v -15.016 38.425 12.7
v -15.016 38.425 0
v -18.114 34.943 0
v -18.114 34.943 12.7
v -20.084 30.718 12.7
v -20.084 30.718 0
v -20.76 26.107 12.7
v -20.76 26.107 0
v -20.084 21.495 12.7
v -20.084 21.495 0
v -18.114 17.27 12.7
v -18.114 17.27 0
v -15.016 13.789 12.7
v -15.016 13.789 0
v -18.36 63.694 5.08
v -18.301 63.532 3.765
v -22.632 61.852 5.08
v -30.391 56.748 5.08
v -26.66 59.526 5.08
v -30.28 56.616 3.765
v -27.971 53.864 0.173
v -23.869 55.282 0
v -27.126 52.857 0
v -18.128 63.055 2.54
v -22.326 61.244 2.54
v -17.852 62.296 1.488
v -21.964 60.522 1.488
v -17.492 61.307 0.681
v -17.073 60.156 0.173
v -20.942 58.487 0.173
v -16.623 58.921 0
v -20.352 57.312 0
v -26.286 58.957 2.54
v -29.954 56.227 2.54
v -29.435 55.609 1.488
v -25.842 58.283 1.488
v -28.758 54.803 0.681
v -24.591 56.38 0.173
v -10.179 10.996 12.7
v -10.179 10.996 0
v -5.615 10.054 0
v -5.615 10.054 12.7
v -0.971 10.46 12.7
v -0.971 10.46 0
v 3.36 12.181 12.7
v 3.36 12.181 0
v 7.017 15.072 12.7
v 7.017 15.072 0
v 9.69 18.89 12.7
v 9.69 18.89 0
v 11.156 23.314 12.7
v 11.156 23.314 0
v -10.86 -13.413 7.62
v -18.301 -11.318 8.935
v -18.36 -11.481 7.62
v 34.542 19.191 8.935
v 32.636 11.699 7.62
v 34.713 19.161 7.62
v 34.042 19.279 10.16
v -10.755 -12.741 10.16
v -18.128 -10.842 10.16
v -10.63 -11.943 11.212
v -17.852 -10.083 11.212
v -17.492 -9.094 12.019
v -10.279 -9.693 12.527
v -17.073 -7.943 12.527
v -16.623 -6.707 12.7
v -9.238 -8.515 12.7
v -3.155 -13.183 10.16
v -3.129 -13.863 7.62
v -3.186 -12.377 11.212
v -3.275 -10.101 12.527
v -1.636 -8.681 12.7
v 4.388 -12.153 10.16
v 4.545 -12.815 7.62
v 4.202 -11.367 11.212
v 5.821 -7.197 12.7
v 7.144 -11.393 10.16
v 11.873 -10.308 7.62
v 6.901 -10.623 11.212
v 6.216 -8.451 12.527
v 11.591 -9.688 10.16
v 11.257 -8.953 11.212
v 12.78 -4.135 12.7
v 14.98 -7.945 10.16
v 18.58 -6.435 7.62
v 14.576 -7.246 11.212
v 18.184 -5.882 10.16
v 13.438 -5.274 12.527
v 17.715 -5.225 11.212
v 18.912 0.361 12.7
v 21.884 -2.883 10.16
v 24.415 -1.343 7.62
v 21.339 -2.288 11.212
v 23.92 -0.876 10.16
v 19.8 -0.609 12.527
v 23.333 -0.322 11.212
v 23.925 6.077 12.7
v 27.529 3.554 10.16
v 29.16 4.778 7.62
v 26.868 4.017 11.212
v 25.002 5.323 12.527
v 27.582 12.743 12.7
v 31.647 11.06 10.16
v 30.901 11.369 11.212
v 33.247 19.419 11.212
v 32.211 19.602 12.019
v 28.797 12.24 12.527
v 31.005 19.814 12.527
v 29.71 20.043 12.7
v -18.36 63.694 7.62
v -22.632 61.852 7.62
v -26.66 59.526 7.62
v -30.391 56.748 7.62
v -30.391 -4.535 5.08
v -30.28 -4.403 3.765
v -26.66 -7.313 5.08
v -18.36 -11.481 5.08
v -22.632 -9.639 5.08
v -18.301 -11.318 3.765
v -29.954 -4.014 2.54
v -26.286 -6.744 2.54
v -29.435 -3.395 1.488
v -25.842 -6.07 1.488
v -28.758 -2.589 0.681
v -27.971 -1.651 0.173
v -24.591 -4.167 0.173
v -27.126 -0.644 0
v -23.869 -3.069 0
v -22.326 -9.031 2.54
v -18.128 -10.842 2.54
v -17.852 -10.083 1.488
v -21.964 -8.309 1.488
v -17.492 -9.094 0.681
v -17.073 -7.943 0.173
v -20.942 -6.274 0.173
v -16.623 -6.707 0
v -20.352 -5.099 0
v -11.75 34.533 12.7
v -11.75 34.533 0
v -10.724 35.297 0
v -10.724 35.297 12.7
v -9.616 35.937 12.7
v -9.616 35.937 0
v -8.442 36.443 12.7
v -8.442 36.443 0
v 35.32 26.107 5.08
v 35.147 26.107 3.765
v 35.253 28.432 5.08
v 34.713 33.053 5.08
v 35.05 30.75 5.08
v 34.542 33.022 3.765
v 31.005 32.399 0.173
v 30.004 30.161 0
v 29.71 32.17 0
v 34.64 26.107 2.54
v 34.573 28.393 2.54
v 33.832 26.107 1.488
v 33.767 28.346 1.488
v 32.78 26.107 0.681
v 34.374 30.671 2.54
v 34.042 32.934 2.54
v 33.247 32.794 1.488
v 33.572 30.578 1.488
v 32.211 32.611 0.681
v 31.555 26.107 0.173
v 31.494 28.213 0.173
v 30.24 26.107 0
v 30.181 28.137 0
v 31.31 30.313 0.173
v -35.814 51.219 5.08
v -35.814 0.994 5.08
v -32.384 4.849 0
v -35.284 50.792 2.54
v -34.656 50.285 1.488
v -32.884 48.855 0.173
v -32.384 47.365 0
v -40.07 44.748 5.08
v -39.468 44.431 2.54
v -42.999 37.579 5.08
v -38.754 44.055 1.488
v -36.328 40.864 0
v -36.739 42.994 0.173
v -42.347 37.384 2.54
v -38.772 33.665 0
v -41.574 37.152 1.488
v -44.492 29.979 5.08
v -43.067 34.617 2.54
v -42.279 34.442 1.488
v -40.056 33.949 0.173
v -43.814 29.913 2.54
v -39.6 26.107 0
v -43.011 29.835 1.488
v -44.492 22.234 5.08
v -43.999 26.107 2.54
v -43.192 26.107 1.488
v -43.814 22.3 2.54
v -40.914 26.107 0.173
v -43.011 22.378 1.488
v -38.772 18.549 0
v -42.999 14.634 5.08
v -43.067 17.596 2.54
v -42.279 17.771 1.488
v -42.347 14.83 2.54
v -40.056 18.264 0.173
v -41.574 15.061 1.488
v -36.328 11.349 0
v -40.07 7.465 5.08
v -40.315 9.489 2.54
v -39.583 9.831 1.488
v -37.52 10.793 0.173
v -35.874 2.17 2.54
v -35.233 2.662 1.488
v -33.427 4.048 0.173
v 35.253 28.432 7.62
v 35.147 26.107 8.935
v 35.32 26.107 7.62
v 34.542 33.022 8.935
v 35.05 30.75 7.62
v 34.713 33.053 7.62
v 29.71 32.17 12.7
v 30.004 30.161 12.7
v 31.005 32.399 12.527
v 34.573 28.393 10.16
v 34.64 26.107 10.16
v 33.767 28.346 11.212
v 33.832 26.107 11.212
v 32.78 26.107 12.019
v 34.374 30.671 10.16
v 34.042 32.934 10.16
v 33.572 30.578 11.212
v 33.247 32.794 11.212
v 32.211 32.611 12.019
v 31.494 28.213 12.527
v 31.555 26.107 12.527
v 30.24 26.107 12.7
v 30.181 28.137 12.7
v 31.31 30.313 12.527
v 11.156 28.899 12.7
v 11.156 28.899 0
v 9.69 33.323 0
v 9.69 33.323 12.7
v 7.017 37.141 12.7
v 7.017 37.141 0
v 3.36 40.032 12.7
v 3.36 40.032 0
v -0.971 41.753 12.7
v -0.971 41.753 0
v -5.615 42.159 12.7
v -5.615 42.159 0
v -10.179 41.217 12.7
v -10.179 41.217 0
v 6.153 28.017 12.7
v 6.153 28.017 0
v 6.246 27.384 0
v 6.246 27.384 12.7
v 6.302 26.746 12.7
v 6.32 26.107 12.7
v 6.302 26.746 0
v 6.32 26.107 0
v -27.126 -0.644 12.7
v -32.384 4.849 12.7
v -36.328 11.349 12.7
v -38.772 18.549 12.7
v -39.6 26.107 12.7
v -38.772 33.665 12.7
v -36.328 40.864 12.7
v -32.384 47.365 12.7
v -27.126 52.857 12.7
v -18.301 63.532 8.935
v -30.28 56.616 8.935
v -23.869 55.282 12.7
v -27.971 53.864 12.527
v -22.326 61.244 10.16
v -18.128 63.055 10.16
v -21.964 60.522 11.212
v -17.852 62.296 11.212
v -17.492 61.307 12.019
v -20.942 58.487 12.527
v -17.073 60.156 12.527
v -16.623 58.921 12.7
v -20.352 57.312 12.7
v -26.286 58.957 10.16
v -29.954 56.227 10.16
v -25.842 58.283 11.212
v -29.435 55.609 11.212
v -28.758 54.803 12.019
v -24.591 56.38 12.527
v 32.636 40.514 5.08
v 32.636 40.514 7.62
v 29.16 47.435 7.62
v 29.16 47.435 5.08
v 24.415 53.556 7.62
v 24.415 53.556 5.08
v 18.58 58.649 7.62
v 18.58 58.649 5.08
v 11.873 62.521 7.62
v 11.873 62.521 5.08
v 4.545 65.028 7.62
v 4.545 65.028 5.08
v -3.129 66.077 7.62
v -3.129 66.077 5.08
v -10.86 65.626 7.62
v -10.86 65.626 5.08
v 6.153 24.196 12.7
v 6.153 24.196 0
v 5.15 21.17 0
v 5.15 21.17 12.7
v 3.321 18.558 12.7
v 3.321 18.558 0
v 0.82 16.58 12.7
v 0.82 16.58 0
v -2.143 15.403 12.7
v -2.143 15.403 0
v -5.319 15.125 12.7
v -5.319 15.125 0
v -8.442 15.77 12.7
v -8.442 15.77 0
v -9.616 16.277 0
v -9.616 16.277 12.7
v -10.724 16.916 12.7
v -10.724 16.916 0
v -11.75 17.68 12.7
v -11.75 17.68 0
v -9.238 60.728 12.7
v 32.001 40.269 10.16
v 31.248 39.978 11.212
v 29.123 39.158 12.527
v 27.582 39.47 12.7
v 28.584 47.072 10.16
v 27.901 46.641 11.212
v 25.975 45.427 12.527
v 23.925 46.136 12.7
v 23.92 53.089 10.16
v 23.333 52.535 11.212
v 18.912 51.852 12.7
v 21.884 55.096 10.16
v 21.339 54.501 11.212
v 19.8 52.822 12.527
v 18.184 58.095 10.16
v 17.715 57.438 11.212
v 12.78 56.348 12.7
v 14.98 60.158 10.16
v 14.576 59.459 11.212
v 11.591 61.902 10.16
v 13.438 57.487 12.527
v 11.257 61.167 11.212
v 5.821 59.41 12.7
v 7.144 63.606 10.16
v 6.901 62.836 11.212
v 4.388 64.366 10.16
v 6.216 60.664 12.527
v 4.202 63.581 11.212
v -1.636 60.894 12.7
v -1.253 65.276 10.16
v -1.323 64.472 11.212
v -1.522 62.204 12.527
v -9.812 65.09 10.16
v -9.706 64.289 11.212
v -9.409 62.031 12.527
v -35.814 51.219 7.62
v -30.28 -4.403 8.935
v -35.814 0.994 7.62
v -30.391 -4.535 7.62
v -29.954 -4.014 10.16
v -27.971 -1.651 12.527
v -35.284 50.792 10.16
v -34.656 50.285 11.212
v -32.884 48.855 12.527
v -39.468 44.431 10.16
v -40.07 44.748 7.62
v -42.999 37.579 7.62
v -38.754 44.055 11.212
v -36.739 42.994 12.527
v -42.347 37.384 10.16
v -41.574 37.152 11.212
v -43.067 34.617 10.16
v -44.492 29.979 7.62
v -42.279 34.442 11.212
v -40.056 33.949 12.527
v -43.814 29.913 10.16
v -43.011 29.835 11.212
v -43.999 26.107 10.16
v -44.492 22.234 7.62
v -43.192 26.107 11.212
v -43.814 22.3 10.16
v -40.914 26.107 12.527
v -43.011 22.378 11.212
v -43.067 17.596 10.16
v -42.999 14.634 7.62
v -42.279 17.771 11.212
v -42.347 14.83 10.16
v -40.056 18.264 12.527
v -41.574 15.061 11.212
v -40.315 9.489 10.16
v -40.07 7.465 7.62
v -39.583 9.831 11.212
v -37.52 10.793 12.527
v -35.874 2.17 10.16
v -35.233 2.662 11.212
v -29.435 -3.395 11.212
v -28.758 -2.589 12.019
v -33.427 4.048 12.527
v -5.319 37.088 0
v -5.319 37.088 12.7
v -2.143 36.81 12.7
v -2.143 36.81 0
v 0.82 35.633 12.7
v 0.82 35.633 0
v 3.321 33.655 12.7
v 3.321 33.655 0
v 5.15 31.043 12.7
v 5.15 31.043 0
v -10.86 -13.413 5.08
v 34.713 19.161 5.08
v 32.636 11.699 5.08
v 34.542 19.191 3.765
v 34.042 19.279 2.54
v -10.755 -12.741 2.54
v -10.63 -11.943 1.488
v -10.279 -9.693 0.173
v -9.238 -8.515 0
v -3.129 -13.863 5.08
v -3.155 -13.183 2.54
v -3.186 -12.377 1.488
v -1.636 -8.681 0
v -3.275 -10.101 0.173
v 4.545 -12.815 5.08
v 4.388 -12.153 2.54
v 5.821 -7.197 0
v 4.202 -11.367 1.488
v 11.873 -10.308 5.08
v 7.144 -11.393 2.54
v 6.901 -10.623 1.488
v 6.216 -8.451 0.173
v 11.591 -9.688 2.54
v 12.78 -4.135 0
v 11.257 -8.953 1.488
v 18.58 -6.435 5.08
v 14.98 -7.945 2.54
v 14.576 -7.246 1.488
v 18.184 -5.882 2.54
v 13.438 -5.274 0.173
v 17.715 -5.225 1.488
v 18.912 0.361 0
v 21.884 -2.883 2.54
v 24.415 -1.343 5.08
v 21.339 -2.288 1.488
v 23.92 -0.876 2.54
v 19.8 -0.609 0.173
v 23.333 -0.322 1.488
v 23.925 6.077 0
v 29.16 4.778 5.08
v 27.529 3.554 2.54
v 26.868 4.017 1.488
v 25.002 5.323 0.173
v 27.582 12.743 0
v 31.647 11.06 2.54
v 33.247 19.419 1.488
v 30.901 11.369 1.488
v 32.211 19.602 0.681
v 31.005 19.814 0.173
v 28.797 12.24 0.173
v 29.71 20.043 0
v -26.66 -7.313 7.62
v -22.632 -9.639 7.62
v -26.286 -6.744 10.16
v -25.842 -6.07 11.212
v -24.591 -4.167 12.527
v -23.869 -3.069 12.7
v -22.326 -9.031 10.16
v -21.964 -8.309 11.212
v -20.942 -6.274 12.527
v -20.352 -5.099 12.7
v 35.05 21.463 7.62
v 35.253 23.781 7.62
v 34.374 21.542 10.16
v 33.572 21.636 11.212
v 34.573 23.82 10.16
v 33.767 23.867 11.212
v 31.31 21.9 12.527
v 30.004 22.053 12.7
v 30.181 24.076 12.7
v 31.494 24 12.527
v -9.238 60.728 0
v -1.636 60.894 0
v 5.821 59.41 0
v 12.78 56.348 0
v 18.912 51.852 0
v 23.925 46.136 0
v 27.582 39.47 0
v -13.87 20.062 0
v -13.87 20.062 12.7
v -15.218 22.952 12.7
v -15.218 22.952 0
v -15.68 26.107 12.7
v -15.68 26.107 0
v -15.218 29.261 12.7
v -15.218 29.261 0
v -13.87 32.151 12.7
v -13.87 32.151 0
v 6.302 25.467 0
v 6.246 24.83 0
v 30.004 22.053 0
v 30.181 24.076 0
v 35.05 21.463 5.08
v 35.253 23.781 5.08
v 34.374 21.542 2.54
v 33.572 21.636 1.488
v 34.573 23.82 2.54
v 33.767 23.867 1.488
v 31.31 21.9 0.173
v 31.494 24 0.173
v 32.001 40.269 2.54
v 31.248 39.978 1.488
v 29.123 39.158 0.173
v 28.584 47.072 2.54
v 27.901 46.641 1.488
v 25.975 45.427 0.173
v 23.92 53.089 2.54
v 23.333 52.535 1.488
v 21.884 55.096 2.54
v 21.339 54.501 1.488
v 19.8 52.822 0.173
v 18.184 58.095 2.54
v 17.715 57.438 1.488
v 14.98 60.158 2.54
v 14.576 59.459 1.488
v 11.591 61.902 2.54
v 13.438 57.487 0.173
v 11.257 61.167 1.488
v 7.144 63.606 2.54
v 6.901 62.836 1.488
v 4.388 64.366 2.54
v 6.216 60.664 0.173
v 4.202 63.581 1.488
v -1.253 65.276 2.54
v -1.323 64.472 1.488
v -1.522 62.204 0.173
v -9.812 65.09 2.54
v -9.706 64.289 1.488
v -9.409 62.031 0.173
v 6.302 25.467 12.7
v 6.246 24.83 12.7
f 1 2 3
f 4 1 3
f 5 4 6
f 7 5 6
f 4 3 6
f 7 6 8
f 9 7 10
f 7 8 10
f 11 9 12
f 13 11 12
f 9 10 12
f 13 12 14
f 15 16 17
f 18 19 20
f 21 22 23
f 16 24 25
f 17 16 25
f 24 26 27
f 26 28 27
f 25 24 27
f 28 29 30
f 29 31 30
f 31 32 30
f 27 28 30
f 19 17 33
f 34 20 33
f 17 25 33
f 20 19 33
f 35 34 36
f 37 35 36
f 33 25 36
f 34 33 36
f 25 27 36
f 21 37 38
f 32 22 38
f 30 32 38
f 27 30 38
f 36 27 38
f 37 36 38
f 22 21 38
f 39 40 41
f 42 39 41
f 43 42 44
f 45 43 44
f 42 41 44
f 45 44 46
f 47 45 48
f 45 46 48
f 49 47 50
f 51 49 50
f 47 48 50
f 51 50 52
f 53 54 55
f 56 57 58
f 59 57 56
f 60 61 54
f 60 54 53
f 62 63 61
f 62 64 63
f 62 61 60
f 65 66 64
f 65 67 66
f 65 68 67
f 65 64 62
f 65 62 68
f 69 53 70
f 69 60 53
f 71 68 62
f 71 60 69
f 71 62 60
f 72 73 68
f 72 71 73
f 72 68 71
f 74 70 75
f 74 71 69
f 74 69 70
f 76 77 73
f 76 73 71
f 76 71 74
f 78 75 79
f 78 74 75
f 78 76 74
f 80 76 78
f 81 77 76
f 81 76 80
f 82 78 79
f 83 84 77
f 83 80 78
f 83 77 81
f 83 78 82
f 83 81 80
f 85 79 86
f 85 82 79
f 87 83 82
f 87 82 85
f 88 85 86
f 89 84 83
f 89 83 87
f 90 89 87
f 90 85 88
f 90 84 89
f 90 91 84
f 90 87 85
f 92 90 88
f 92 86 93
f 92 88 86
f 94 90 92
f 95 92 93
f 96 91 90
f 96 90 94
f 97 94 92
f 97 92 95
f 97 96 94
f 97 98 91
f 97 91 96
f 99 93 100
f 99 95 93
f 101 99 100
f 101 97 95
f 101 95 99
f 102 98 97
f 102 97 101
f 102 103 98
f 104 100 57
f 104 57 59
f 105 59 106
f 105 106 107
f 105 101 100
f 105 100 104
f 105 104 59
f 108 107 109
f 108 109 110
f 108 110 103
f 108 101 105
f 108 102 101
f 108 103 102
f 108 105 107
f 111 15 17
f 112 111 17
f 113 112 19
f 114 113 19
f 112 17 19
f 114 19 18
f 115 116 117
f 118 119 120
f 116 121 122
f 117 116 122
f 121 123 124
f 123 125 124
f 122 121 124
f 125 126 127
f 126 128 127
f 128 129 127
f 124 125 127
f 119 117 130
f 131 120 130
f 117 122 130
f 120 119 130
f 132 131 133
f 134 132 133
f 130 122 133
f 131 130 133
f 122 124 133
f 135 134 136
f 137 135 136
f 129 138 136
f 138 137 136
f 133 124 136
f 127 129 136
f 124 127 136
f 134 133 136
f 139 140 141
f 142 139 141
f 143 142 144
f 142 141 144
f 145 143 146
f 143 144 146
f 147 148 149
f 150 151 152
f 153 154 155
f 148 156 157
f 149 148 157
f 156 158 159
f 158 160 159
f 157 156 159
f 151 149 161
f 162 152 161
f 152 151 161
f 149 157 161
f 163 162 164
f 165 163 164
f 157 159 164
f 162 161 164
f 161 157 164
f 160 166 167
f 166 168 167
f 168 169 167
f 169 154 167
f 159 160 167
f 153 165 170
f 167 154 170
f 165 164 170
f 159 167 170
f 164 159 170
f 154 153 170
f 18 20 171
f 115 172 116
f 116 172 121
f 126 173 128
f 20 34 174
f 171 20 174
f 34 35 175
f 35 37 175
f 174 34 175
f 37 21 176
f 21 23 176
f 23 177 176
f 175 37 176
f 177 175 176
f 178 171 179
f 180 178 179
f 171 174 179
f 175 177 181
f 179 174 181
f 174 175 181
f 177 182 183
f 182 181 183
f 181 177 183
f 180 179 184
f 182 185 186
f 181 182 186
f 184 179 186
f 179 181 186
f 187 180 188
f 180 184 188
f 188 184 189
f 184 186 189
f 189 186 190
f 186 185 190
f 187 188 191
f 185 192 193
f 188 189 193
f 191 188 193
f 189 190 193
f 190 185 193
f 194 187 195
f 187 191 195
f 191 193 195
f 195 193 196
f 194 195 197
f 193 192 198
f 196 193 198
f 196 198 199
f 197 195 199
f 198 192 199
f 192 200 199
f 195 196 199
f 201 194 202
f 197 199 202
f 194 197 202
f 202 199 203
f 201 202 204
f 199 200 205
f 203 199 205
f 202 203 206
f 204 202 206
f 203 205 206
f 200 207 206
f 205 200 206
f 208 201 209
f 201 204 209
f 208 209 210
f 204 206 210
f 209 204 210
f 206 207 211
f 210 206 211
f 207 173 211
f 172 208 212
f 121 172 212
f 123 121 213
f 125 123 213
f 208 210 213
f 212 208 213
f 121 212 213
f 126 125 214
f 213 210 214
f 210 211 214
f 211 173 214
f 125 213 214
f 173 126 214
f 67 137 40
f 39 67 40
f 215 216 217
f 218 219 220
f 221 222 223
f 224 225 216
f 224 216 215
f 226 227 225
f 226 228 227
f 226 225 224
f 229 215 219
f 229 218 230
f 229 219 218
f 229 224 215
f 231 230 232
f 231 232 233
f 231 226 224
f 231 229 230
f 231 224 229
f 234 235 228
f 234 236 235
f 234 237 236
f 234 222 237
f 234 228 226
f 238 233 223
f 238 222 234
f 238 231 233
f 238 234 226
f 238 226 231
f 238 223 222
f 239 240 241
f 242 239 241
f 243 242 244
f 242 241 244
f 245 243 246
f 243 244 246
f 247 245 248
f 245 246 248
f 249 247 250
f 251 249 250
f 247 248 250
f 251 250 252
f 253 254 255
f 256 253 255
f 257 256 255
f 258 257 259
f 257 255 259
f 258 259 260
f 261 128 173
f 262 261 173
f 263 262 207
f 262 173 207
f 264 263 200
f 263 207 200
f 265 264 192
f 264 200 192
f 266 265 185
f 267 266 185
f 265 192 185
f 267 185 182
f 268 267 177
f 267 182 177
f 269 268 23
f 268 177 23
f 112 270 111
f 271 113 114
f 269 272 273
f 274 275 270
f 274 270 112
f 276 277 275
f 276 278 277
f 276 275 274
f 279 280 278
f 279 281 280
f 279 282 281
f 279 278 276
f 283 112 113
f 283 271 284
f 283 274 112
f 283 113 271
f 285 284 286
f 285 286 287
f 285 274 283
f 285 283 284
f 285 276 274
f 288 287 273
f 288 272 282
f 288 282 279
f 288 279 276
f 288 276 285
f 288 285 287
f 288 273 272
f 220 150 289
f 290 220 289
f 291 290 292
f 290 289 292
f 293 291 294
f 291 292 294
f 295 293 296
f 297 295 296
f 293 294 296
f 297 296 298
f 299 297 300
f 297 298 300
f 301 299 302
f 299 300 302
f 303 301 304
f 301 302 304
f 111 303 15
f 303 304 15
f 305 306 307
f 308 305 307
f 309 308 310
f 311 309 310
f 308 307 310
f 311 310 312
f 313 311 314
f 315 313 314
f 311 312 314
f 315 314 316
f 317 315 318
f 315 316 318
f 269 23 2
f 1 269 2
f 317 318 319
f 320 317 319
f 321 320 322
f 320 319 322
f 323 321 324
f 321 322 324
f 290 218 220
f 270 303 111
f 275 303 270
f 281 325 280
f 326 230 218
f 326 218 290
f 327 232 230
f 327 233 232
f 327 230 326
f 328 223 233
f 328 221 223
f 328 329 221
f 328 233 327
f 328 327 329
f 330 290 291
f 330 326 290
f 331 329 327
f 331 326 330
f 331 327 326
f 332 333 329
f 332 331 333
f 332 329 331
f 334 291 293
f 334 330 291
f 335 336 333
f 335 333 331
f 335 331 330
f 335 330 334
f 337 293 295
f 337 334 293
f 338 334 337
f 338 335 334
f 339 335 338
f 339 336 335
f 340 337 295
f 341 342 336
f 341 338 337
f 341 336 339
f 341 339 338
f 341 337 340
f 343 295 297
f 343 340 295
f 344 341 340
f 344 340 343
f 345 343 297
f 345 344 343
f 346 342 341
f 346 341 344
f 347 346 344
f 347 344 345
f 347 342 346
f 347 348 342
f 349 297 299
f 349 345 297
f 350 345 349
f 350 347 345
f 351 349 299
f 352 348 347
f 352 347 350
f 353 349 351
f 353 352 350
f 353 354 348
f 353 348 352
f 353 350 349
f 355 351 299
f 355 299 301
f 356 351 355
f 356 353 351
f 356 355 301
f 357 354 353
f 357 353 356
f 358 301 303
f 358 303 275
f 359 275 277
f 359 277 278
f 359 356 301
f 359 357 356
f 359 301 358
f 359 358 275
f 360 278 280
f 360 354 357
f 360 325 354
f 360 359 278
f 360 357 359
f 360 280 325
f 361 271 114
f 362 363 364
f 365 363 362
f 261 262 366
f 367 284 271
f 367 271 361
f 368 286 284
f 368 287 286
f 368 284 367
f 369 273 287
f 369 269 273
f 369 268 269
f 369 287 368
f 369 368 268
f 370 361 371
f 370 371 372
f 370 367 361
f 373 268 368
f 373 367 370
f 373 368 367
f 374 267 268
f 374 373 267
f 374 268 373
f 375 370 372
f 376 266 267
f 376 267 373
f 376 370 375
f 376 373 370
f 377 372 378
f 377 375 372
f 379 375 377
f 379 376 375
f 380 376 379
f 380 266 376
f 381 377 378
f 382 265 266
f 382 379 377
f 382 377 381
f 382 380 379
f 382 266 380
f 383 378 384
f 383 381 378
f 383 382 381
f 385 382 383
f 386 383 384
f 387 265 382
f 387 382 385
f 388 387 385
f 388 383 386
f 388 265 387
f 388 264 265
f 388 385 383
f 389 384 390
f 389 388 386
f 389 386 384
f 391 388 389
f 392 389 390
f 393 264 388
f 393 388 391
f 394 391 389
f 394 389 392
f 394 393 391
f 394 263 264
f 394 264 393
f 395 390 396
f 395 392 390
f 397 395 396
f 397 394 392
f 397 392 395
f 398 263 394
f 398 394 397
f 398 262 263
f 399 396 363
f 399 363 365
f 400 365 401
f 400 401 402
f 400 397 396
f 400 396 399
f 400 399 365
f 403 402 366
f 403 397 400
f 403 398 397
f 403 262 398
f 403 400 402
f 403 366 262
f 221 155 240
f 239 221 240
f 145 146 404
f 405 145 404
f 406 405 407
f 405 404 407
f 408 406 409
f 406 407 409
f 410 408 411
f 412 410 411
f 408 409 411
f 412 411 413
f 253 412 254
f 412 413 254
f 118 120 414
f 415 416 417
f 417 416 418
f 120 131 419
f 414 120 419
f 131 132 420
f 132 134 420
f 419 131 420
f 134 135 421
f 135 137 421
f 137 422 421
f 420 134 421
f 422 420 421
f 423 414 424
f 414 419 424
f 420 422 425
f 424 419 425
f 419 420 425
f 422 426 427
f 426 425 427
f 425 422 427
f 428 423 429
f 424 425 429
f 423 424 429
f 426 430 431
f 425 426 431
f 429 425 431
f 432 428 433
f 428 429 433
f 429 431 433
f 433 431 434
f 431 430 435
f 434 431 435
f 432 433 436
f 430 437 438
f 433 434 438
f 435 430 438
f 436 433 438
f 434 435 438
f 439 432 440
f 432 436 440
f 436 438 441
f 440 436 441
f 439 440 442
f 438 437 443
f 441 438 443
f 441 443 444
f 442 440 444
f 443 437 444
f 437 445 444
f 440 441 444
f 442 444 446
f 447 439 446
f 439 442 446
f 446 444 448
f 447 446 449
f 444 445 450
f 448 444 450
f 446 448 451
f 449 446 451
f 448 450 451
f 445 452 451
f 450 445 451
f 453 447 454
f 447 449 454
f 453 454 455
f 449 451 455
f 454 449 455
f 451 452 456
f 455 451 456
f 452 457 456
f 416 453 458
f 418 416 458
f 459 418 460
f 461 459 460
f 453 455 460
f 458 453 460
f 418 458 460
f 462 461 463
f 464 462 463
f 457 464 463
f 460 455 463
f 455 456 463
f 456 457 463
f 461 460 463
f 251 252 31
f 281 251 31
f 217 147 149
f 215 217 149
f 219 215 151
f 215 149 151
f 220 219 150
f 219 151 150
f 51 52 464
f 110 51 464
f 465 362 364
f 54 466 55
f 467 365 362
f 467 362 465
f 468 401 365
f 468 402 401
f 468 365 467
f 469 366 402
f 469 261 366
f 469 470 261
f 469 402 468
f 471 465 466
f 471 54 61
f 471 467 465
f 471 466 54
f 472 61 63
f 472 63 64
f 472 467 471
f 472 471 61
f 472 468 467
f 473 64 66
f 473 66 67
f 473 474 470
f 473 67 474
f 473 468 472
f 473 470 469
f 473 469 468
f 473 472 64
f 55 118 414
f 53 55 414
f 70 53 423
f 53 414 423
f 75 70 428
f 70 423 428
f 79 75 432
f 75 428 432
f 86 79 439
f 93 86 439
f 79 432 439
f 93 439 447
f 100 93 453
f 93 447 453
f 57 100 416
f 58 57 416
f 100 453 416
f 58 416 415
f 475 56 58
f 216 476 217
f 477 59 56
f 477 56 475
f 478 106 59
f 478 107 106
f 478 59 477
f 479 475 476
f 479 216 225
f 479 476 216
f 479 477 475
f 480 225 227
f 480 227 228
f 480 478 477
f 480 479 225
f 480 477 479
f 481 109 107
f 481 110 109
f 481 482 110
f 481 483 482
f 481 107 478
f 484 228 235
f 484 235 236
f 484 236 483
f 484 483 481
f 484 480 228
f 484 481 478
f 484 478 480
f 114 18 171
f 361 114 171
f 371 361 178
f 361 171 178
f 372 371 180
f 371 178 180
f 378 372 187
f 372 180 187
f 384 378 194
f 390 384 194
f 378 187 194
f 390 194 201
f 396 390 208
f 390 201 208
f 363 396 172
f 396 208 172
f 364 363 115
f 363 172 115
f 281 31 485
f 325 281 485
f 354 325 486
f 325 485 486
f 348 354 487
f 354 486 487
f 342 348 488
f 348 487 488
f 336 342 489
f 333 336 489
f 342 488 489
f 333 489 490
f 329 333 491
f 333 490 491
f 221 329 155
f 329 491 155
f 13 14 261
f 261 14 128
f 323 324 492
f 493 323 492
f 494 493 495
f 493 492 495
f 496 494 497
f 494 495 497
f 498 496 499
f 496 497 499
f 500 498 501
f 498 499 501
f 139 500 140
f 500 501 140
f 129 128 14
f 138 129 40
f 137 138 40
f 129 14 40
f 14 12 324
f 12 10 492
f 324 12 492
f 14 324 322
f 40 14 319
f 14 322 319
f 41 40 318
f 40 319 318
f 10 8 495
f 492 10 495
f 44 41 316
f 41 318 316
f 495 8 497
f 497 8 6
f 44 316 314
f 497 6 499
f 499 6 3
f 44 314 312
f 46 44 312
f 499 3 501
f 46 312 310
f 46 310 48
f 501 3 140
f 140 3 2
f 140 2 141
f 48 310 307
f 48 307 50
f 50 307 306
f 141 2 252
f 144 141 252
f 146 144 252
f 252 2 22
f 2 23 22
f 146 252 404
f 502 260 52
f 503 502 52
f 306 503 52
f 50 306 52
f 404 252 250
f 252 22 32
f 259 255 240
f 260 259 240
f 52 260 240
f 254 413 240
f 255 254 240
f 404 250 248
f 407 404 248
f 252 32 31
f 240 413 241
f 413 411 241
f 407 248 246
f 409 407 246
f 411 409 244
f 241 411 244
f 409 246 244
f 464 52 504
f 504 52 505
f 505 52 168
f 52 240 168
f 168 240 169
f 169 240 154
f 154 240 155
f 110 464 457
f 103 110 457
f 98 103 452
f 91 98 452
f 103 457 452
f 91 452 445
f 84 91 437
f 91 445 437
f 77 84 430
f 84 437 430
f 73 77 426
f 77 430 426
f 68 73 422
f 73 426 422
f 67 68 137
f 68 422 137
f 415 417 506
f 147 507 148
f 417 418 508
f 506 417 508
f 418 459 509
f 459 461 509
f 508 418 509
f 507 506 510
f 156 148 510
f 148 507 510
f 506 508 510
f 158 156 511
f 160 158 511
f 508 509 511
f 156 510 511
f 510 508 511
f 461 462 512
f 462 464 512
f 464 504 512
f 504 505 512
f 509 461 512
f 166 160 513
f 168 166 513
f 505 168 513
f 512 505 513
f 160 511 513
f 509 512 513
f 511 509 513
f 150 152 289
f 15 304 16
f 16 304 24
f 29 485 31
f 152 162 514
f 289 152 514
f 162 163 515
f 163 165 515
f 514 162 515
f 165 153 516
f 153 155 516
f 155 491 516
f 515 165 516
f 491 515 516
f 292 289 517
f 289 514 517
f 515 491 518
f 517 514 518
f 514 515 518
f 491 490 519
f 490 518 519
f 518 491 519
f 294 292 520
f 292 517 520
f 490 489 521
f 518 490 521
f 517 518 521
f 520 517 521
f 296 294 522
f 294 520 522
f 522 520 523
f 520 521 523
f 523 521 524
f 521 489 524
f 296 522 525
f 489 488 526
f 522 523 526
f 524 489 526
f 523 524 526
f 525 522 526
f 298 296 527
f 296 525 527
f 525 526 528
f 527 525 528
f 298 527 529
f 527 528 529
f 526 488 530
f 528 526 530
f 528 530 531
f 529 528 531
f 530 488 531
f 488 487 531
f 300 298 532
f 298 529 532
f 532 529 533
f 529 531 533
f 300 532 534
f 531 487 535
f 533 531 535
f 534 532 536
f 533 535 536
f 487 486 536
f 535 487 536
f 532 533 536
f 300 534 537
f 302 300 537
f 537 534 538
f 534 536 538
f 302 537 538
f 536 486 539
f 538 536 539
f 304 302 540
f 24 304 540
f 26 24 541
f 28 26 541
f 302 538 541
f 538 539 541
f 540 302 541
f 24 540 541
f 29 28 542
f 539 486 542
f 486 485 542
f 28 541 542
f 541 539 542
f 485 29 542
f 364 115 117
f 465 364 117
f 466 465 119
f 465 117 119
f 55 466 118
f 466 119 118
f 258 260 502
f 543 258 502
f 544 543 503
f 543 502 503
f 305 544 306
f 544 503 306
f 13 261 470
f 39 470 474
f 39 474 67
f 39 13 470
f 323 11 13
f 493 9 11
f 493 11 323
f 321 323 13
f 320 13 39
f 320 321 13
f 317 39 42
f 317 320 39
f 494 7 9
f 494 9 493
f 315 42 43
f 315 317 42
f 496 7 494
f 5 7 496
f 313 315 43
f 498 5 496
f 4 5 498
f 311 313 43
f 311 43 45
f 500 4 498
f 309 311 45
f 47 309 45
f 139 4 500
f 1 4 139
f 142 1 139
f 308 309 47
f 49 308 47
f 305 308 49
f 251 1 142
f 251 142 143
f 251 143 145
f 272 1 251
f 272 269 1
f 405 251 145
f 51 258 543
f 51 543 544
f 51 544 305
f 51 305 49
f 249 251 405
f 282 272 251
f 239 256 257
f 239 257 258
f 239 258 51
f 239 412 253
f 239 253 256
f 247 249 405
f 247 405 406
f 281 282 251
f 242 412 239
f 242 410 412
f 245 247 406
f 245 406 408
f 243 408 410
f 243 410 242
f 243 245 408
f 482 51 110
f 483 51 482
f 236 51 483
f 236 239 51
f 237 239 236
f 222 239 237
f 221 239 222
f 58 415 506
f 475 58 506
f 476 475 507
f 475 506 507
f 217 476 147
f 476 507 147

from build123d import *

# Parameters (mm, degrees)
F1_DEPTH = 12.7
F2_R     = 5.07999


# Not quite as in the source:
# - a fillet or chamfer is up to 0.001 mm smaller than in the source, because OpenCascade refuses the exact size


with BuildPart() as f1:
    # F0 (on Top) → F1 (new body)
    with BuildSketch(Plane.XY):
        with BuildLine():
            ThreePointArc((-27.1257893014, 52.8568671478), (-22.1396459711, 56.3482022942), (-16.6229893761, 58.9206615119))
            Line((-16.6229893761, 58.9206615119), (-18.3604517042, 63.6943000255))
            ThreePointArc((-18.3604517042, 63.6943000255), (-24.6796459711, 60.7476113455), (-30.3911503586, 56.7483729188))
            Line((-30.3911503586, 56.7483729188), (-27.1257893014, 52.8568671478))
        make_face()
        with BuildLine():
            ThreePointArc((-27.1257893014, -0.6436767596), (-39.5996459711, 26.1065951941), (-27.1257893014, 52.8568671478))
            Line((-27.1257893014, 52.8568671478), (-30.3911503586, 56.7483729188))
            ThreePointArc((-30.3911503586, 56.7483729188), (-44.6796459711, 26.1065951941), (-30.3911503586, -4.5351825307))
            Line((-30.3911503586, -4.5351825307), (-27.1257893014, -0.6436767596))
        make_face()
        with BuildLine():
            Line((-18.3604517042, -11.4811096374), (-16.6229893761, -6.7074711238))
            ThreePointArc((-16.6229893761, -6.7074711238), (-22.1396459711, -4.1350119061), (-27.1257893014, -0.6436767596))
            Line((-27.1257893014, -0.6436767596), (-30.3911503586, -4.5351825307))
            ThreePointArc((-30.3911503586, -4.5351825307), (-24.6796459711, -8.5344209573), (-18.3604517042, -11.4811096374))
        make_face()
        with BuildLine():
            Line((34.7126641494, 19.1606680874), (29.709840764, 20.04280083))
            ThreePointArc((29.709840764, 20.04280083), (12.7803540289, -4.1350119061), (-16.6229893761, -6.7074711238))
            Line((-16.6229893761, -6.7074711238), (-18.3604517042, -11.4811096374))
            ThreePointArc((-18.3604517042, -11.4811096374), (15.3203540289, -8.5344209573), (34.7126641494, 19.1606680874))
        make_face()
        with BuildLine():
            Line((34.7126641494, 33.0525223008), (29.709840764, 32.1703895582))
            ThreePointArc((29.709840764, 32.1703895582), (30.1074728862, 29.1500737308), (30.2403540289, 26.1065951941))
            ThreePointArc((30.2403540289, 26.1065951941), (30.1074728862, 23.0631166573), (29.709840764, 20.04280083))
            Line((29.709840764, 20.04280083), (34.7126641494, 19.1606680874))
            ThreePointArc((34.7126641494, 19.1606680874), (35.1681419525, 22.6203654842), (35.3203540289, 26.1065951941))
            ThreePointArc((35.3203540289, 26.1065951941), (35.1681419525, 29.592824904), (34.7126641494, 33.0525223008))
        make_face()
        with BuildLine():
            ThreePointArc((-15.0156707349, 38.4245898394), (-12.7196459711, 40.0322836869), (-10.1793298758, 41.2168525363))
            Line((-10.1793298758, 41.2168525363), (-16.6229893761, 58.9206615119))
            ThreePointArc((-16.6229893761, 58.9206615119), (-22.1396459711, 56.3482022942), (-27.1257893014, 52.8568671478))
            Line((-27.1257893014, 52.8568671478), (-15.0156707349, 38.4245898394))
        make_face()
        with BuildLine():
            ThreePointArc((-8.4418675477, 36.4432140227), (0.8203540289, 35.6328746357), (6.153239312, 28.0167251484))
            Line((6.153239312, 28.0167251484), (11.1560626973, 28.898857891))
            ThreePointArc((11.1560626973, 28.898857891), (3.3603540289, 40.0322836869), (-10.1793298758, 41.2168525363))
            Line((-10.1793298758, 41.2168525363), (-8.4418675477, 36.4432140227))
        make_face()
        with BuildLine():
            ThreePointArc((-11.7503096777, 17.6801063198), (-15.6796459711, 26.1065951941), (-11.7503096777, 34.5330840684))
            Line((-11.7503096777, 34.5330840684), (-15.0156707349, 38.4245898394))
            ThreePointArc((-15.0156707349, 38.4245898394), (-20.7596459711, 26.1065951941), (-15.0156707349, 13.7886005487))
            Line((-15.0156707349, 13.7886005487), (-11.7503096777, 17.6801063198))
        make_face()
        with BuildLine():
            ThreePointArc((-11.7503096777, 34.5330840684), (-10.1796459711, 35.6328746357), (-8.4418675477, 36.4432140227))
            Line((-8.4418675477, 36.4432140227), (-10.1793298758, 41.2168525363))
            ThreePointArc((-10.1793298758, 41.2168525363), (-12.7196459711, 40.0322836869), (-15.0156707349, 38.4245898394))
            Line((-15.0156707349, 38.4245898394), (-11.7503096777, 34.5330840684))
        make_face()
        with BuildLine():
            Line((11.1560626973, 23.3143324972), (6.153239312, 24.1964652397))
            ThreePointArc((6.153239312, 24.1964652397), (0.8203540289, 16.5803157525), (-8.4418675477, 15.7699763654))
            Line((-8.4418675477, 15.7699763654), (-10.1793298758, 10.9963378518))
            ThreePointArc((-10.1793298758, 10.9963378518), (3.3603540289, 12.1809067012), (11.1560626973, 23.3143324972))
        make_face()
        with BuildLine():
            ThreePointArc((6.153239312, 28.0167251484), (6.2784957079, 27.0653083643), (6.3203540289, 26.1065951941))
            ThreePointArc((6.3203540289, 26.1065951941), (6.2784957079, 25.1478820239), (6.153239312, 24.1964652397))
            Line((6.153239312, 24.1964652397), (11.1560626973, 23.3143324972))
            ThreePointArc((11.1560626973, 23.3143324972), (11.3391647742, 24.7051308507), (11.4003540289, 26.1065951941))
            ThreePointArc((11.4003540289, 26.1065951941), (11.3391647742, 27.5080595375), (11.1560626973, 28.898857891))
            Line((11.1560626973, 28.898857891), (6.153239312, 28.0167251484))
        make_face()
        with BuildLine():
            Line((-10.1793298758, 10.9963378518), (-8.4418675477, 15.7699763654))
            ThreePointArc((-8.4418675477, 15.7699763654), (-10.1796459711, 16.5803157525), (-11.7503096777, 17.6801063198))
            Line((-11.7503096777, 17.6801063198), (-15.0156707349, 13.7886005487))
            ThreePointArc((-15.0156707349, 13.7886005487), (-12.7196459711, 12.1809067012), (-10.1793298758, 10.9963378518))
        make_face()
        with BuildLine():
            ThreePointArc((-16.6229893761, 58.9206615119), (12.7803540289, 56.3482022942), (29.709840764, 32.1703895582))
            Line((29.709840764, 32.1703895582), (34.7126641494, 33.0525223008))
            ThreePointArc((34.7126641494, 33.0525223008), (15.3203540289, 60.7476113455), (-18.3604517042, 63.6943000255))
            Line((-18.3604517042, 63.6943000255), (-16.6229893761, 58.9206615119))
        make_face()
        with BuildLine():
            Line((29.709840764, 32.1703895582), (11.1560626973, 28.898857891))
            ThreePointArc((11.1560626973, 28.898857891), (11.3391647742, 27.5080595375), (11.4003540289, 26.1065951941))
            ThreePointArc((11.4003540289, 26.1065951941), (11.3391647742, 24.7051308507), (11.1560626973, 23.3143324972))
            Line((11.1560626973, 23.3143324972), (29.709840764, 20.04280083))
            ThreePointArc((29.709840764, 20.04280083), (30.1074728862, 23.0631166573), (30.2403540289, 26.1065951941))
            ThreePointArc((30.2403540289, 26.1065951941), (30.1074728862, 29.1500737308), (29.709840764, 32.1703895582))
        make_face()
        with BuildLine():
            Line((-16.6229893761, -6.7074711238), (-10.1793298758, 10.9963378518))
            ThreePointArc((-10.1793298758, 10.9963378518), (-12.7196459711, 12.1809067012), (-15.0156707349, 13.7886005487))
            Line((-15.0156707349, 13.7886005487), (-27.1257893014, -0.6436767596))
            ThreePointArc((-27.1257893014, -0.6436767596), (-22.1396459711, -4.1350119061), (-16.6229893761, -6.7074711238))
        make_face()
    extrude(amount=F1_DEPTH)

    # F2 (radius 5.08 in the source; OpenCascade refuses exactly that, so slightly less here)
    f2_edges = [f1.edges().sort_by_distance(p)[0] for p in [
        (-44.071956, 19.160668, 12.7),
        (-44.071956, 19.160668, 0),
    ]]
    fillet(f2_edges, radius=F2_R)


solid = f1.part
